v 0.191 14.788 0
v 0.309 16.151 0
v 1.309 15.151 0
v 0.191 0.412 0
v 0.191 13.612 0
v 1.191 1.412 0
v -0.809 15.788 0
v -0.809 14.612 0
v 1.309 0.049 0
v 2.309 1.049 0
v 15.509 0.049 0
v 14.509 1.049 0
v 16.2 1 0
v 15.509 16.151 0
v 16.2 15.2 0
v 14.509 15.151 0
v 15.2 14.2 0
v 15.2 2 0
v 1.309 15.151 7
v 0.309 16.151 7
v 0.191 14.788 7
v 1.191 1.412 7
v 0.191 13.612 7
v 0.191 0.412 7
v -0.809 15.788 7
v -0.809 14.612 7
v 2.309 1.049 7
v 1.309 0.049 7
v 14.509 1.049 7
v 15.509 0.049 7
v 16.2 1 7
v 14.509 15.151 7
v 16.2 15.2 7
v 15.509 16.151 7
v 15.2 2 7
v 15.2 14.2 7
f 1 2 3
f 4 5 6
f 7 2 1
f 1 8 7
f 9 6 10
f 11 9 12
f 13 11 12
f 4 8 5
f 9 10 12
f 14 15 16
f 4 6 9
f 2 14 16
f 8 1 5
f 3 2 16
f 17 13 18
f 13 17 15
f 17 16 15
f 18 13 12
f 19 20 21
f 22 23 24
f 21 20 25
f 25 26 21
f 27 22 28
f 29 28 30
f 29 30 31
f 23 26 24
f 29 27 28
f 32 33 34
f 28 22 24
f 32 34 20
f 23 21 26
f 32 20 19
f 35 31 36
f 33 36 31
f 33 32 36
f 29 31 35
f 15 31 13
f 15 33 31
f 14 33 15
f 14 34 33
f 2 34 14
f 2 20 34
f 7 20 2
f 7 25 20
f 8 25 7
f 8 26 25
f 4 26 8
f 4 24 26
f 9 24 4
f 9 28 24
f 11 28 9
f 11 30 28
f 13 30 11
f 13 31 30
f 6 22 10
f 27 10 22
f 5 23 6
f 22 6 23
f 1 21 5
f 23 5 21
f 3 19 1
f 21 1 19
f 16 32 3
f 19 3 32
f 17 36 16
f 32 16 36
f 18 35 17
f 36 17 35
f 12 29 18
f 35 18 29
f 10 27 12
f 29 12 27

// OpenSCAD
// file: roundedsquare.scad
module roundedSquare(size=[10,10], radius=1, center=false) {
    translate(center ? -size/2 : [0,0])
    hull() {
        translate([radius,radius]) circle(r=radius);
        translate([size[0]-radius,radius]) circle(r=radius);
        translate([size[0]-radius,size[0]-radius]) circle(r=radius);
        translate([0,size[0]-radius]) circle(r=radius);
    }
}
// main file
use <roundedsquare.scad>;

innerWidth = 13.7;
innerHeight = 4;
length = 7; // was 9
tolerance = 0.25;
wall = 1;

render(convexity=2)
linear_extrude(height=length)
difference() {
    roundedSquare([tolerance*2+innerWidth+2*wall,tolerance*2+innerHeight+2*wall]);
    translate([wall,wall,-1])
    roundedSquare([tolerance*2+innerWidth,tolerance*2+innerHeight]);
}
